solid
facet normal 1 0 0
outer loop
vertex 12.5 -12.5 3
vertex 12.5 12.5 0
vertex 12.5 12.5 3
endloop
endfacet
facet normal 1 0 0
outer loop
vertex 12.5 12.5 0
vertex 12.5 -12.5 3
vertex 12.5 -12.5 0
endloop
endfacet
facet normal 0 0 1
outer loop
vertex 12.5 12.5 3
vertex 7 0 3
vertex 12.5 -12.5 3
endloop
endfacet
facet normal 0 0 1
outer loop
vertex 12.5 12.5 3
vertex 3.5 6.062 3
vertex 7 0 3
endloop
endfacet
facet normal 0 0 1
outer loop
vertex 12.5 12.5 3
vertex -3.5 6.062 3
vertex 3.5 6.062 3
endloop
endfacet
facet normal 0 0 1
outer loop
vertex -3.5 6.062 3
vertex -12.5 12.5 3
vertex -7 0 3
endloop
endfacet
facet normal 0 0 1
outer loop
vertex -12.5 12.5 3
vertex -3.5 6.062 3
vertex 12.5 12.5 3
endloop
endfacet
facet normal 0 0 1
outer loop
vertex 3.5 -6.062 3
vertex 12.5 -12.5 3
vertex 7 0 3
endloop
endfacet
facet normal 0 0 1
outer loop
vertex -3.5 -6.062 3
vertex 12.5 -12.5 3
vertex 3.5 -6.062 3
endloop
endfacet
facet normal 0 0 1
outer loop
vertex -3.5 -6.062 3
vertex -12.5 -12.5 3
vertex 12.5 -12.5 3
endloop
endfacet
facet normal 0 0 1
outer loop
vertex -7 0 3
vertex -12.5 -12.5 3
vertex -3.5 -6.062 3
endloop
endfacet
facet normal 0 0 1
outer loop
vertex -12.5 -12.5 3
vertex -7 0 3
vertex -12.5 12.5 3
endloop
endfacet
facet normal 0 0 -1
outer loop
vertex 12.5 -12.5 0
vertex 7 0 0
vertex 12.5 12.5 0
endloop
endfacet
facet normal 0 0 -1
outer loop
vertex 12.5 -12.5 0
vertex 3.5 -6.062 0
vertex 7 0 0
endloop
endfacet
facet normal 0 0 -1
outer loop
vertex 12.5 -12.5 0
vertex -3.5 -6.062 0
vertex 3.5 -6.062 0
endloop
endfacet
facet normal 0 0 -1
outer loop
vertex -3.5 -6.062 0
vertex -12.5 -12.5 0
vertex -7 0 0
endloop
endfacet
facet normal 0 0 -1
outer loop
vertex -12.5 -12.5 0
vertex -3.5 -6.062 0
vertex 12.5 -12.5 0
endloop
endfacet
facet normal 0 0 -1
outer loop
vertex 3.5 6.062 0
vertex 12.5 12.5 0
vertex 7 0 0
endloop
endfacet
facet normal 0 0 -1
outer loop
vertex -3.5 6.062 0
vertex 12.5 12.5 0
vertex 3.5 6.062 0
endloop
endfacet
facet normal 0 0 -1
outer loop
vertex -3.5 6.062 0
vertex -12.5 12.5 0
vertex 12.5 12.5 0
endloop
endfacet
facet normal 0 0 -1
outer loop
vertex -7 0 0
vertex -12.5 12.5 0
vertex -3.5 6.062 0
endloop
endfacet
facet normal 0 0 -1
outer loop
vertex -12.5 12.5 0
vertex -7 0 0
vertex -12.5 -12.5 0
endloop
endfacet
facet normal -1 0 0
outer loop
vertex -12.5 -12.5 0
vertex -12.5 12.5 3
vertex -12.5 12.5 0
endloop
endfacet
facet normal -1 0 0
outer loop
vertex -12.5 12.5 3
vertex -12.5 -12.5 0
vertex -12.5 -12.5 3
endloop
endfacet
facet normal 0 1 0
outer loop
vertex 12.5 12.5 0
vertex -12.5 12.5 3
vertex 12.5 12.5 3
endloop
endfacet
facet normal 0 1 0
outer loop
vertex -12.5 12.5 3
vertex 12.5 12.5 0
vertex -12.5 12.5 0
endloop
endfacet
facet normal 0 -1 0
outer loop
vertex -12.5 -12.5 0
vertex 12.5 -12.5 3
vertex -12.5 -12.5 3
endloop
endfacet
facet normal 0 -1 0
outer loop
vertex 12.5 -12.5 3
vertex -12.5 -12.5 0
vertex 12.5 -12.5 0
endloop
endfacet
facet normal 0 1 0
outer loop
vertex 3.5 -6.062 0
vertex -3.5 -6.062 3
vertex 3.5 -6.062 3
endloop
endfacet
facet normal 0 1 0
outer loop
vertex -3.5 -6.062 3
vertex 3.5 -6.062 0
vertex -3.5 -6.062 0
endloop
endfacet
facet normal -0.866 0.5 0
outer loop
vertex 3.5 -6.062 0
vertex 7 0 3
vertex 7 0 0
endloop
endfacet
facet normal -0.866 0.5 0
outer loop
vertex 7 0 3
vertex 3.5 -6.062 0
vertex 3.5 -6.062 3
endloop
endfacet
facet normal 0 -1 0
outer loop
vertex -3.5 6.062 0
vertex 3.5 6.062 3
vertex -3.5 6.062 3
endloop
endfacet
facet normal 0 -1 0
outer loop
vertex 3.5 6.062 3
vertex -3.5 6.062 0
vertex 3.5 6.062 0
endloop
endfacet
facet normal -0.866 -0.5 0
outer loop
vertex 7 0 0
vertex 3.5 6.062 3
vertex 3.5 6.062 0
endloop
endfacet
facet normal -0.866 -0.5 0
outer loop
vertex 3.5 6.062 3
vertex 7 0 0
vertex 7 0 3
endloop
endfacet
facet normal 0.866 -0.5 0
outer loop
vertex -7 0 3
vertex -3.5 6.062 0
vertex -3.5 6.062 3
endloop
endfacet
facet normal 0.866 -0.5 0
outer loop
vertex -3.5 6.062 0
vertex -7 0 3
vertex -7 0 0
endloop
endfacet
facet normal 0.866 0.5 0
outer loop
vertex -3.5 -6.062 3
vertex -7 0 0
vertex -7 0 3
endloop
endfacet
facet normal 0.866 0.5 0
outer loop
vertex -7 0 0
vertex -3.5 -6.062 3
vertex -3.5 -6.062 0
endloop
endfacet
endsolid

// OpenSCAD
// Raspicam for Pibow (model B)
// A raspicam support for the Pibow case (Pimoroni).

// Copyright (c) 2014 Jérémie DECOCK <jd.jdhp@gmail.com>

// TRIPOD BASE //////////////////////////////

// Tripod fixation screw:
//     Diameter: 7 mm
module tripod_base() {

    // Local const
    screw_radius = 7;
    screw_fn = 6;

    cylinder(r=screw_radius, h=board_height+1, center=true, $fn=screw_fn);

}

// TEST /////////////////////////////////////

board_width = 25;    // x
board_depth = 25;    // y
board_height = 3;    // z

translate([0, 0, board_height/2]) {
    difference() {
        cube([board_width, board_depth, board_height], center=true);
        #tripod_base();
    }
}
